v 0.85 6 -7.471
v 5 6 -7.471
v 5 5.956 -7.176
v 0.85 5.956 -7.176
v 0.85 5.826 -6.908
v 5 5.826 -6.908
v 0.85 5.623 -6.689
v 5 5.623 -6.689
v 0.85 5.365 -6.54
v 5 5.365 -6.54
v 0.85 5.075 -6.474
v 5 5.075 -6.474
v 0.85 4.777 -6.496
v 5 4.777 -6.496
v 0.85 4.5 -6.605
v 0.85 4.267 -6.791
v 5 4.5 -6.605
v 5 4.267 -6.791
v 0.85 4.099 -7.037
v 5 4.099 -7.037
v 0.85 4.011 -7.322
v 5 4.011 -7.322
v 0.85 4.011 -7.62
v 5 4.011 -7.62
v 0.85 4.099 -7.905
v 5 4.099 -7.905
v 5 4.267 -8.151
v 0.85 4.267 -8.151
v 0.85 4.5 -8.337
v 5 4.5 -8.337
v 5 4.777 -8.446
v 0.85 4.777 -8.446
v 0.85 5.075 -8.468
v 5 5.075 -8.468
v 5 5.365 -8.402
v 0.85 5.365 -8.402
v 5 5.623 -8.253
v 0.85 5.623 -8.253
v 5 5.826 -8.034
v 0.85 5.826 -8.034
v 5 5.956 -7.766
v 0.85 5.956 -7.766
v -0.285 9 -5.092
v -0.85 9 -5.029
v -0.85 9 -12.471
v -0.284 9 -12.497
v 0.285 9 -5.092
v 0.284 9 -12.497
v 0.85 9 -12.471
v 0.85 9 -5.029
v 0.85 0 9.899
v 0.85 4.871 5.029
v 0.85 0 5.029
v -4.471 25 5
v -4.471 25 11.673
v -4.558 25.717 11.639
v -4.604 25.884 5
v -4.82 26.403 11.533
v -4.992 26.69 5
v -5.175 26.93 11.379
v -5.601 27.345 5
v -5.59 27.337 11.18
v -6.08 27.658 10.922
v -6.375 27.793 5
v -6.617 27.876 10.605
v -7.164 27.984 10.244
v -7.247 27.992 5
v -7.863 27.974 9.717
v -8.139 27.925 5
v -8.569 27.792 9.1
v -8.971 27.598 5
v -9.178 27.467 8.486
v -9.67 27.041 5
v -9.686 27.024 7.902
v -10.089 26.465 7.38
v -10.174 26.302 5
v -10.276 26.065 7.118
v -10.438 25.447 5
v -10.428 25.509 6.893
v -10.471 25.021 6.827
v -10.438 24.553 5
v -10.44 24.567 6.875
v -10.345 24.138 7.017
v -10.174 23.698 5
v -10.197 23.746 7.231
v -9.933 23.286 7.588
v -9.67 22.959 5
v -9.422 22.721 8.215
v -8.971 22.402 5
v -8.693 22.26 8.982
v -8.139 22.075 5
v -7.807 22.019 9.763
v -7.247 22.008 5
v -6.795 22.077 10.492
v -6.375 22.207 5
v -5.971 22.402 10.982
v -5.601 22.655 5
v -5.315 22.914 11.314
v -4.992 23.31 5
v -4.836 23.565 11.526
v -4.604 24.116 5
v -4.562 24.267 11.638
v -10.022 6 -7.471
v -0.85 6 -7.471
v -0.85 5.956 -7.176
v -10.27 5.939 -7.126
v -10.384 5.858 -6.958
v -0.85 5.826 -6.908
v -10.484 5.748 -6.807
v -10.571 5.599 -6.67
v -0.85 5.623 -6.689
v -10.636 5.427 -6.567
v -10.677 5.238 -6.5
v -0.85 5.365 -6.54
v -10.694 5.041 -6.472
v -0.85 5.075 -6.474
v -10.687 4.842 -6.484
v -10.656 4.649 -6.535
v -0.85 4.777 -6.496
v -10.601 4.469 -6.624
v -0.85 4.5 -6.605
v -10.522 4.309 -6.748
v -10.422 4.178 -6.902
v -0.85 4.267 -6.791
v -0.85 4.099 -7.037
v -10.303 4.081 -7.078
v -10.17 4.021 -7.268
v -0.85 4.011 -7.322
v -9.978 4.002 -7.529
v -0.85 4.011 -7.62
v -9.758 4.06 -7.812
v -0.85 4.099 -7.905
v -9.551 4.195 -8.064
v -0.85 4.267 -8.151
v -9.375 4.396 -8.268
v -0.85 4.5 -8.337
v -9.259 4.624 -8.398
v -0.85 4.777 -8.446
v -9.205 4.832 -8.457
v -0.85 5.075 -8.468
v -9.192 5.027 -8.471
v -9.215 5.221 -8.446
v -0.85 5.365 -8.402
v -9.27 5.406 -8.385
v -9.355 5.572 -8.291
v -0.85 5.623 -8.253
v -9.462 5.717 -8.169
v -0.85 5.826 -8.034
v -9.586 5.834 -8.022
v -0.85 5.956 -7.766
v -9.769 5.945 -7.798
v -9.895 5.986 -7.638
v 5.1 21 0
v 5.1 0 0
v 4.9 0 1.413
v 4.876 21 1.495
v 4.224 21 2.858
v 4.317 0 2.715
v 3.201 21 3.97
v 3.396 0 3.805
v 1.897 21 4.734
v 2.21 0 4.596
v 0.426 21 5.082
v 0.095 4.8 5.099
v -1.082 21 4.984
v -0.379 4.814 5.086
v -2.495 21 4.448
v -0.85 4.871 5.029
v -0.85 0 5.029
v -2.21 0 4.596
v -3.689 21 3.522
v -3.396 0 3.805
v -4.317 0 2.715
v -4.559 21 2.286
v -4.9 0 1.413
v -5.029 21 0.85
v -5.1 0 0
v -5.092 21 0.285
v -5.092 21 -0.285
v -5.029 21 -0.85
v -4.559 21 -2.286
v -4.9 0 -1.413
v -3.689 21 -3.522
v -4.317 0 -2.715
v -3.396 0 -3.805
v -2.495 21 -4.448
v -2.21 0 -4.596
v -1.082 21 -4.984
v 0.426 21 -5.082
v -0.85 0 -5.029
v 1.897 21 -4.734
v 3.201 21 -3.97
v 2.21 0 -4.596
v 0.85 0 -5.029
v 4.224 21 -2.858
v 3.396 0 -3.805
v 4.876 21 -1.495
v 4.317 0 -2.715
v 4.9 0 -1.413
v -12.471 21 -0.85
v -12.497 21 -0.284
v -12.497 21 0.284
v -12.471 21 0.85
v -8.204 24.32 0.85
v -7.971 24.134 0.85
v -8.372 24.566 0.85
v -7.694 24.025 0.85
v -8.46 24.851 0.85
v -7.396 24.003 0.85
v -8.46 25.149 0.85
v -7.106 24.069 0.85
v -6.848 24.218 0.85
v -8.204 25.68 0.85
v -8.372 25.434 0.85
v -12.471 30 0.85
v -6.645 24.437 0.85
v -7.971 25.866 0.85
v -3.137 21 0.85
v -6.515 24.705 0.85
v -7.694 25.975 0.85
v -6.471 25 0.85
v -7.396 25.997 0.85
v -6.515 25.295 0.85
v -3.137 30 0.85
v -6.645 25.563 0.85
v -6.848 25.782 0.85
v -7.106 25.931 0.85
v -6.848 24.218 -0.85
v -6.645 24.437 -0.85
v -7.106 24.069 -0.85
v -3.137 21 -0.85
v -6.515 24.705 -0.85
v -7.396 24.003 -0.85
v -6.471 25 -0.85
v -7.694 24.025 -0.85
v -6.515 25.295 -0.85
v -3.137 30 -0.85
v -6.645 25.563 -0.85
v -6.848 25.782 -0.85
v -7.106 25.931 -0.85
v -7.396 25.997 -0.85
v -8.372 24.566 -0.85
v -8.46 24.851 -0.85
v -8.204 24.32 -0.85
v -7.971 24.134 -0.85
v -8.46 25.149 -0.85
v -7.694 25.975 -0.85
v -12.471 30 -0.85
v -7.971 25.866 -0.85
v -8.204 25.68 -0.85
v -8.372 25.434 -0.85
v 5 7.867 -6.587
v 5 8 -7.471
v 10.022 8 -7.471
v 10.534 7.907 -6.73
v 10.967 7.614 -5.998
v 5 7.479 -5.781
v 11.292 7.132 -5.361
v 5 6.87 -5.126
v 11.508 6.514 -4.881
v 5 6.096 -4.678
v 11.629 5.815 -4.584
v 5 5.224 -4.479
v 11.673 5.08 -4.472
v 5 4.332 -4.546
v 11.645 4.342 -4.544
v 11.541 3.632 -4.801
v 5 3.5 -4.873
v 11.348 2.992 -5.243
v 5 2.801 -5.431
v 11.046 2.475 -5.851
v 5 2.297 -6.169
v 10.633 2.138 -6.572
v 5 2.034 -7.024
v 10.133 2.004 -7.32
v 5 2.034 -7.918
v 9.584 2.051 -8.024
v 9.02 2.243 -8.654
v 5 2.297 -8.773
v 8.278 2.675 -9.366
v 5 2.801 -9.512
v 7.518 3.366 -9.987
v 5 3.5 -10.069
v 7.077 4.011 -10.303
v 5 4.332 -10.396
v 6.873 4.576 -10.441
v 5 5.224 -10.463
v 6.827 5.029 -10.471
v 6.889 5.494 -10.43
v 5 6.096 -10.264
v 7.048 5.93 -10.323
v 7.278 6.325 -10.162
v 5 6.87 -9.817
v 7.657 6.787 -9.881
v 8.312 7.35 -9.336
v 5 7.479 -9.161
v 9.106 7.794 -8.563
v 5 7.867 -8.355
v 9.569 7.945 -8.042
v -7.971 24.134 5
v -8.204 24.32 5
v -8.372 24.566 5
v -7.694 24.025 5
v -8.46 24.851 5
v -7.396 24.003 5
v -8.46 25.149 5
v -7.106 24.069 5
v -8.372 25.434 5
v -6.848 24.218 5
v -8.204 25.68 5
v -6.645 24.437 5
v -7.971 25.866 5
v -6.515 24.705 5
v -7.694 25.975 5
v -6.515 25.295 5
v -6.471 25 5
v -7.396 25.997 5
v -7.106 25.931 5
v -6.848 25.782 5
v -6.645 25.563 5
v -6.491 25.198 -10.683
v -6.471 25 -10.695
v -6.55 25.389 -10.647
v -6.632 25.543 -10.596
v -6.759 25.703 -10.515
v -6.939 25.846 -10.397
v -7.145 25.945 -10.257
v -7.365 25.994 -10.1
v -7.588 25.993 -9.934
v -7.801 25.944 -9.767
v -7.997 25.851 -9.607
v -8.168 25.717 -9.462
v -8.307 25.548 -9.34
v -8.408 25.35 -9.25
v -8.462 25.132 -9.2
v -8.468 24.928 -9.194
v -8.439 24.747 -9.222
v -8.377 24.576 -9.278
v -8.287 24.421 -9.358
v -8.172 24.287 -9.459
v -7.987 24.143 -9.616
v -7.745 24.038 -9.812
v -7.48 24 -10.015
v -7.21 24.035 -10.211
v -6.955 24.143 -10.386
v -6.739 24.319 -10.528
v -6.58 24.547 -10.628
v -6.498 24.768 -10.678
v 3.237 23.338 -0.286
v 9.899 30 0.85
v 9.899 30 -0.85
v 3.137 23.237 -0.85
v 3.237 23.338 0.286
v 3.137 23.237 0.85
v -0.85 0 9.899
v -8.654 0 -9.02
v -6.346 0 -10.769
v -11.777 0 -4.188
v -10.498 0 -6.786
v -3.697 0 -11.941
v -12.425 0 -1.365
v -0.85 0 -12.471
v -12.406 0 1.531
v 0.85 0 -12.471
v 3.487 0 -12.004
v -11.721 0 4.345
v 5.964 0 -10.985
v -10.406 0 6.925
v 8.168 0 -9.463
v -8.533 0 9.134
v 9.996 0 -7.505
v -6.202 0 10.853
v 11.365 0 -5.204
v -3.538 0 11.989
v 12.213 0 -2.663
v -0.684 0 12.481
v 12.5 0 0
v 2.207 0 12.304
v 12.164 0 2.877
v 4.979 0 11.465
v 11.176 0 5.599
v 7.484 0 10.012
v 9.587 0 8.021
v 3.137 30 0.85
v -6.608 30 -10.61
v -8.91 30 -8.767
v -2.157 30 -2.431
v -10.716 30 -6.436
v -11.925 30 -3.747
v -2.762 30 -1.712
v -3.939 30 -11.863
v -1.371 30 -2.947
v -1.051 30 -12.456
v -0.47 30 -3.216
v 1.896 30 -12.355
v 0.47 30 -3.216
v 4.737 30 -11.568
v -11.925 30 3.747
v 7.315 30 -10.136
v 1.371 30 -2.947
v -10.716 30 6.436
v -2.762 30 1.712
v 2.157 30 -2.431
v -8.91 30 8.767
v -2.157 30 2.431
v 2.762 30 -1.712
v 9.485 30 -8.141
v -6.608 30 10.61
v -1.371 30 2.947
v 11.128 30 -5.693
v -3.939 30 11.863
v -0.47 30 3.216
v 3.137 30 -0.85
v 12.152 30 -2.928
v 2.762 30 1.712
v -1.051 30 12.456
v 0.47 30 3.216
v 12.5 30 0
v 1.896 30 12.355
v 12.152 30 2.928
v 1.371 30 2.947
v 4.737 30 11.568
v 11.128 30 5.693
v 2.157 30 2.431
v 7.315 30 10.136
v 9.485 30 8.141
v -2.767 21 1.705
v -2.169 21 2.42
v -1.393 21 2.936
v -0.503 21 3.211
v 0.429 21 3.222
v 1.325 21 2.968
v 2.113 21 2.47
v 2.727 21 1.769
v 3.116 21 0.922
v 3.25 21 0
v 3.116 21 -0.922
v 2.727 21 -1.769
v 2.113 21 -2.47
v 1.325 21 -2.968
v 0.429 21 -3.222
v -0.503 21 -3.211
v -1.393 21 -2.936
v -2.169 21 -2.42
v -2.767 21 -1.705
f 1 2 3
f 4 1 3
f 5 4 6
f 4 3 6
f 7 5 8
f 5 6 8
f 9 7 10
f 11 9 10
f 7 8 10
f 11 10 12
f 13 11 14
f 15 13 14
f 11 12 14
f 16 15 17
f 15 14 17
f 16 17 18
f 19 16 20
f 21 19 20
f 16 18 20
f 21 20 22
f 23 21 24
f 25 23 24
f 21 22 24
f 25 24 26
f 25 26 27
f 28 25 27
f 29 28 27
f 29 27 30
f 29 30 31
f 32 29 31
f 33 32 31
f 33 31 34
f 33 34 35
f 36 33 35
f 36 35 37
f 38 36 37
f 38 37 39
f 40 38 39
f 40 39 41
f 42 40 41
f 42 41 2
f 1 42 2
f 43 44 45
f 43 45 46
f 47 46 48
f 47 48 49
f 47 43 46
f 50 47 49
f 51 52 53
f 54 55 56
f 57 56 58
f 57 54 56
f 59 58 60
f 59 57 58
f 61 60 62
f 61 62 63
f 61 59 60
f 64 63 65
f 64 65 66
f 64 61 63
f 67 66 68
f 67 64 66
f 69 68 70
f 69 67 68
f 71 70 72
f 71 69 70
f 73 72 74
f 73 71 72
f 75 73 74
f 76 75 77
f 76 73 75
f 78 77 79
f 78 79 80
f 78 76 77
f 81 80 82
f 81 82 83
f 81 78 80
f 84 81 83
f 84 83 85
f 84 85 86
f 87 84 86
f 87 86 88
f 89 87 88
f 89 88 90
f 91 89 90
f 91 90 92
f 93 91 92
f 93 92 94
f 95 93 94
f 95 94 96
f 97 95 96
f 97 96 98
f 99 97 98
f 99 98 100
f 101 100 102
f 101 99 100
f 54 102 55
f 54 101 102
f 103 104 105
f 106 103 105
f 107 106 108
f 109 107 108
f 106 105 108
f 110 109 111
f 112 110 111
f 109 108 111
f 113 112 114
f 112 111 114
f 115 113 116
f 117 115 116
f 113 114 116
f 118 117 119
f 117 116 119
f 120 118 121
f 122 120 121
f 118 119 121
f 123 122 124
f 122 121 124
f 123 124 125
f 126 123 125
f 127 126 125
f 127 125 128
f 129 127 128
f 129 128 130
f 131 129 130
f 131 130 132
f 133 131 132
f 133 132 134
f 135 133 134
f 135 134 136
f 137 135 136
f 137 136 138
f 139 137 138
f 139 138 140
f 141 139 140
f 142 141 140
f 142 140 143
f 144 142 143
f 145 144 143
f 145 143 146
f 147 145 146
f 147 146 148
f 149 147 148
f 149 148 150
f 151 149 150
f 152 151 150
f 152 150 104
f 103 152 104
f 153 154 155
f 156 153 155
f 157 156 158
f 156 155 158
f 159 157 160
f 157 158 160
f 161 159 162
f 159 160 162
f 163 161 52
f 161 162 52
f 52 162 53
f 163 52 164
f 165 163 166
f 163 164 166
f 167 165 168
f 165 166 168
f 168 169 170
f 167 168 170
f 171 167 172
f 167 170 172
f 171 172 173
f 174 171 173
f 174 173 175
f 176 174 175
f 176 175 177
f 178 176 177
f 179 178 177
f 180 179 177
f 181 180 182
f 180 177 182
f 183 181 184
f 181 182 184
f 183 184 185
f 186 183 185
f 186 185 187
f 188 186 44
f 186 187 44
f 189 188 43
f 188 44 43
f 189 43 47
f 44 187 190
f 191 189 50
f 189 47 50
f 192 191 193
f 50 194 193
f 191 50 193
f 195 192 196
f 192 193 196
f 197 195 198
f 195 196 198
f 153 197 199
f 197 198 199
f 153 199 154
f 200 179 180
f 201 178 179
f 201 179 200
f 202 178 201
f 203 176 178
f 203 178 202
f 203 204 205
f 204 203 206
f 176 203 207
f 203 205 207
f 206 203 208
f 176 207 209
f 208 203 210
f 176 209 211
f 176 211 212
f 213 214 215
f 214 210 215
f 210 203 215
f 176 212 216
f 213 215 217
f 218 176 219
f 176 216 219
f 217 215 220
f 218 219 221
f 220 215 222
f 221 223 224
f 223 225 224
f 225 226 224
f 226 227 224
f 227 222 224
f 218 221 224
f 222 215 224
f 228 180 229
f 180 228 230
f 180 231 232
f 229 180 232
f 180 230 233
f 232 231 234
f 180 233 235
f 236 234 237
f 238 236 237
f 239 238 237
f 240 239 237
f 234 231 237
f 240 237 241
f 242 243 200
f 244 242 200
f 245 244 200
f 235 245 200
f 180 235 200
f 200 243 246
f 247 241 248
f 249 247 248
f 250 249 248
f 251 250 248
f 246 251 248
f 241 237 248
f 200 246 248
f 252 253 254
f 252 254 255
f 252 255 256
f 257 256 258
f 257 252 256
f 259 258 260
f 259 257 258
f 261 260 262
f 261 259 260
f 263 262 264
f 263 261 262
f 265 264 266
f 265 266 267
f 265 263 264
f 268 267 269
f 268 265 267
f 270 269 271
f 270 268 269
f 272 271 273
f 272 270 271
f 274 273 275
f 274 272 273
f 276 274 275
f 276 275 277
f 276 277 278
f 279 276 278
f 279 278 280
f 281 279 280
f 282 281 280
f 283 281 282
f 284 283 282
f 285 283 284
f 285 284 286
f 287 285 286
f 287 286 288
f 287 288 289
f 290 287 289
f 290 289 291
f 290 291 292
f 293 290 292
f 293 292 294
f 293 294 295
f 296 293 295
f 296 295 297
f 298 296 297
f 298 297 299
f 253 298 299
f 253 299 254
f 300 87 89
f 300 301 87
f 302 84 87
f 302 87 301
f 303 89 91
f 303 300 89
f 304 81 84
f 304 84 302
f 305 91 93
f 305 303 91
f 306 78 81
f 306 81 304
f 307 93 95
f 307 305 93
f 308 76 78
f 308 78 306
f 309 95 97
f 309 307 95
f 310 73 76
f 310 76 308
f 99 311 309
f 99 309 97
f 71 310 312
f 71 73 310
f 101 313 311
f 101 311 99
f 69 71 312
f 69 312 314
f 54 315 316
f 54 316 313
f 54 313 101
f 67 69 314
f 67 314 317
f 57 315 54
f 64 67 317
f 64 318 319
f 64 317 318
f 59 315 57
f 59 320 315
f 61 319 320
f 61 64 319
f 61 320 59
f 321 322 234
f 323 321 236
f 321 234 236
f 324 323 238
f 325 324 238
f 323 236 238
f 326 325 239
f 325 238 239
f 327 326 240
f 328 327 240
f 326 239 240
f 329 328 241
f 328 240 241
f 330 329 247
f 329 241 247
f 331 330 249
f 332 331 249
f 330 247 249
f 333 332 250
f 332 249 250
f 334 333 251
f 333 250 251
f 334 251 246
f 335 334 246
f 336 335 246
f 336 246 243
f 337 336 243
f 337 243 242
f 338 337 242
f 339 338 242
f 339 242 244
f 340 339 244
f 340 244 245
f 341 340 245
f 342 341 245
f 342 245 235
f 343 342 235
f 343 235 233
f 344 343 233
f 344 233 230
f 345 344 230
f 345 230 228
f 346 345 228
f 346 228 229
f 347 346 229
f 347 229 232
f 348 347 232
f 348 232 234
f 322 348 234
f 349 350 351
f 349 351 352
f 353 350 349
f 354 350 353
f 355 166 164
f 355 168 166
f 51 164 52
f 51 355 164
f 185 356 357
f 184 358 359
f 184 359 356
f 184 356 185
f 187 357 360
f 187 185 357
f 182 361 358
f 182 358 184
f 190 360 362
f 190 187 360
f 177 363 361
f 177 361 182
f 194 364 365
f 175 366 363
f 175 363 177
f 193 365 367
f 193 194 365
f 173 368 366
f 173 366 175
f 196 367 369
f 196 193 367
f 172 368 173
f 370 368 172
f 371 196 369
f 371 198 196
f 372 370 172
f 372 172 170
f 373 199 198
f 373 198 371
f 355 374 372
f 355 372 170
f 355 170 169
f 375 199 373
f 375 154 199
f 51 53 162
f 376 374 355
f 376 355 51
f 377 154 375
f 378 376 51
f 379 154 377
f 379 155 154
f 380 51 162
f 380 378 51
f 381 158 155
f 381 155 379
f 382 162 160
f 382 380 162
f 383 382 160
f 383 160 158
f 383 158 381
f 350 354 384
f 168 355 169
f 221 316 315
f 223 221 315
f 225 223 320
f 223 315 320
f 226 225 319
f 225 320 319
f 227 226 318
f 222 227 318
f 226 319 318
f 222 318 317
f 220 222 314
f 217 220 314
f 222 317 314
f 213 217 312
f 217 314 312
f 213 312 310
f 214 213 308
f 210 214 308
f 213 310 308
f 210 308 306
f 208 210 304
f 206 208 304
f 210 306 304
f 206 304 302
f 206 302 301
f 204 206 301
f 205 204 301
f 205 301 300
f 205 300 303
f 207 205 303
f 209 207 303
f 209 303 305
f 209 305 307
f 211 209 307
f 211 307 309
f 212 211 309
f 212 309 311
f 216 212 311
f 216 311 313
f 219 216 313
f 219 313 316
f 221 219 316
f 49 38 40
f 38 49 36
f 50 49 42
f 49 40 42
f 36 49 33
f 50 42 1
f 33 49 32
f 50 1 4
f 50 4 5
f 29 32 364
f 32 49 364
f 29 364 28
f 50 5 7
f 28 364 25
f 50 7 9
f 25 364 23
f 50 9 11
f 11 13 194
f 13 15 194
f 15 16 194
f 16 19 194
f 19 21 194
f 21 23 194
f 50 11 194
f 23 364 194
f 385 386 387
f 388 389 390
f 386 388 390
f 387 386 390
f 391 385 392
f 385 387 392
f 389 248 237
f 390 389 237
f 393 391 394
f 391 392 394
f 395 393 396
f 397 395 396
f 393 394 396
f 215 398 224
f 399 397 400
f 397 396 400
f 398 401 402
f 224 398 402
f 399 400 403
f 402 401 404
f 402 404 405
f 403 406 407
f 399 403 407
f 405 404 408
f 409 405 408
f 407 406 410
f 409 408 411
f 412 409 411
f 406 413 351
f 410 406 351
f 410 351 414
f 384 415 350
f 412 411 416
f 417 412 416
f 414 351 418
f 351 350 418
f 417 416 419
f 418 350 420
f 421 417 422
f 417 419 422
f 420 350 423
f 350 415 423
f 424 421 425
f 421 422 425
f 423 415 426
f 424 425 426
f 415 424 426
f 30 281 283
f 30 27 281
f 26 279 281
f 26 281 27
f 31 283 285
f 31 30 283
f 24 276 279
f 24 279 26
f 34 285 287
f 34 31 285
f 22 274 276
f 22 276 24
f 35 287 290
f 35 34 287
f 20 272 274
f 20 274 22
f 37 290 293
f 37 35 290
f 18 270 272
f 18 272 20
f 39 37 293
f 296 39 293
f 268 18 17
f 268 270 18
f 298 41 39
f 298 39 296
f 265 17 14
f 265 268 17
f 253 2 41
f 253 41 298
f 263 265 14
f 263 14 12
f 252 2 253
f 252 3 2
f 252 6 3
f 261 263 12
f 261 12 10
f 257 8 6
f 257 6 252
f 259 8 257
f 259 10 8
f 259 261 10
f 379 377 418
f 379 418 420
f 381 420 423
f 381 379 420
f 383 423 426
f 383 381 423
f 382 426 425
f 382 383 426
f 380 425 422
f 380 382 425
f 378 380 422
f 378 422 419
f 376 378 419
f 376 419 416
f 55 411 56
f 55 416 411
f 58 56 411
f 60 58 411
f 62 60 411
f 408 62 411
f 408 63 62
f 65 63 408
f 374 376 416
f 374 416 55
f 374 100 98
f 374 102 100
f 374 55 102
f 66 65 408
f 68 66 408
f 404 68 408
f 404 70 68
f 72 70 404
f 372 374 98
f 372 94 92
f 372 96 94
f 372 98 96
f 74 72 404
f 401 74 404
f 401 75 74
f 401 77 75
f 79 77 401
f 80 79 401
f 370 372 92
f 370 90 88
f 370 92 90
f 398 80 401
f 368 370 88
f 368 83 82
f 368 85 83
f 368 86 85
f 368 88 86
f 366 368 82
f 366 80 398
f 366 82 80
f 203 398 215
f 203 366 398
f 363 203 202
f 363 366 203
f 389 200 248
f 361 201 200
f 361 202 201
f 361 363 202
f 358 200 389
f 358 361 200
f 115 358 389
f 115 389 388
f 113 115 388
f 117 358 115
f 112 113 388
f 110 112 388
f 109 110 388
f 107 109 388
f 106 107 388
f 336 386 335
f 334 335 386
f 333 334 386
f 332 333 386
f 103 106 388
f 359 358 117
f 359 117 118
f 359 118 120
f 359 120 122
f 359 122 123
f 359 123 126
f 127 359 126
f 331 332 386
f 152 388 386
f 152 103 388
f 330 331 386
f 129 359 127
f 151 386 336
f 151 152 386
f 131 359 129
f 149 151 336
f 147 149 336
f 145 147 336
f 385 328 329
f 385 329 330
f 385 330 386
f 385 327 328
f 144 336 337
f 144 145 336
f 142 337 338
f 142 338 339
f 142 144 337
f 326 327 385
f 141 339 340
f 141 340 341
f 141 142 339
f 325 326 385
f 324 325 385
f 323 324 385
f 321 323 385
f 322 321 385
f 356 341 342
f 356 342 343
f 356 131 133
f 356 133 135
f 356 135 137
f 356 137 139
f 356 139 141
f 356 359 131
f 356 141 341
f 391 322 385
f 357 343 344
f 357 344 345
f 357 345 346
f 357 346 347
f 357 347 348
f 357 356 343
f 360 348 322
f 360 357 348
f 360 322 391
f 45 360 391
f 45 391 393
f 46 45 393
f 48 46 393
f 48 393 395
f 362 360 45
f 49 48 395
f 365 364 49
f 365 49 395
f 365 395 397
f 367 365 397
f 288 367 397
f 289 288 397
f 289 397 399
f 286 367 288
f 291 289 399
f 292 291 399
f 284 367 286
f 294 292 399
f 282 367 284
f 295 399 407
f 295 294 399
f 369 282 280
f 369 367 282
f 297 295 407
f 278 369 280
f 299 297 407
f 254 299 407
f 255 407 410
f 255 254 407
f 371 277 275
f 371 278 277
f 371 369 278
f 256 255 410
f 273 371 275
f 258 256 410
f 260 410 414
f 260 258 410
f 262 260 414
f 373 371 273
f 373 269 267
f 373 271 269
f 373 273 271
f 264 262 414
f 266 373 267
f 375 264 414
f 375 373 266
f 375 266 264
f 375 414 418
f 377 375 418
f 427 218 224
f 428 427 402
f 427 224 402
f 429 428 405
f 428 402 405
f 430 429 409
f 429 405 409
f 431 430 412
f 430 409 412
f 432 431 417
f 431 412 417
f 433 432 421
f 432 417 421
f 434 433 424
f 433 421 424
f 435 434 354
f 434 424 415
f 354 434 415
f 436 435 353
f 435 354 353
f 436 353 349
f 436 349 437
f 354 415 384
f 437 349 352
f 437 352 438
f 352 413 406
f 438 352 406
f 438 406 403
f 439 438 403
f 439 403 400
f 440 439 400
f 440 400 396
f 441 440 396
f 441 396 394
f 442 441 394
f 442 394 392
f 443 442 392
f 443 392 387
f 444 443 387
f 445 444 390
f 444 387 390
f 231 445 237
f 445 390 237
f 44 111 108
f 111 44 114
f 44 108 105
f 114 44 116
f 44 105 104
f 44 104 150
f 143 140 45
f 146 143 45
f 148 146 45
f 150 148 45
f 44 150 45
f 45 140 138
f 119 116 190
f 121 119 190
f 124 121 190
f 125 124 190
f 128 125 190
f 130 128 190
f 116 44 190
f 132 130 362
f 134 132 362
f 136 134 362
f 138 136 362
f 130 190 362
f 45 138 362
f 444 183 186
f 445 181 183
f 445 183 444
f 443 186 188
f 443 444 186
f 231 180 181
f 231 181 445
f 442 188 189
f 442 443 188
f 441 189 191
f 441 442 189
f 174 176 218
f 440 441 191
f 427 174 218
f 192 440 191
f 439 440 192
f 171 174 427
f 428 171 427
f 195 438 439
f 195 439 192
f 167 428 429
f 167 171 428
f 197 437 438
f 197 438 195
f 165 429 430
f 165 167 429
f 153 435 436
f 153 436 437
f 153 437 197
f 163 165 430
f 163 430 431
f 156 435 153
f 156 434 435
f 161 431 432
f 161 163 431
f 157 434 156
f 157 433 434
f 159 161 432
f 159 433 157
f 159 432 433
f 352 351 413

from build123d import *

# Parameters (mm, degrees)
F0_R      = 12.5
F1_DEPTH  = 30
F2_R      = 5.1
F3_DEPTH  = 21
F4_R      = 3.25
F5_DEPTH  = 30
F7_DEPTH  = 9
F11_DEPTH = 4.7828926987
F13_DEPTH = 9
F17_DEPTH = 25
F19_R     = 3
F20_DEPTH = 6.6740273092
F21_R     = 1
F22_DEPTH = 17.5010001
F24_R     = 3
F25_DEPTH = 6.6740273092
F26_R     = 1
F27_DEPTH = 17.5010001


with BuildPart() as f1:
    # F0 (on Front) → F1 (new body)
    with BuildSketch(Plane.XZ):
        Circle(F0_R)
    extrude(amount=-F1_DEPTH)

    # F2 (on face) → F3 (cut)
    with BuildSketch(Plane.XZ):
        Circle(F2_R)
    extrude(amount=-F3_DEPTH, mode=Mode.SUBTRACT)

    # F4 (on face) → F5 (cut)
    with BuildSketch(Plane(origin=(0, 30, 0), x_dir=(-1, 0, 0), z_dir=(0, 1, 0))):
        Circle(F4_R)
    extrude(amount=-F5_DEPTH, mode=Mode.SUBTRACT)

    # F6 (on face) → F7 (cut)
    with BuildSketch(Plane(origin=(0, 30, 0), x_dir=(-1, 0, 0), z_dir=(0, 1, 0))):
        with BuildLine():
            Line((12.4710665141, 0.85), (3.1368774283, 0.85))
            ThreePointArc((3.1368774283, 0.85), (3.25, 0), (3.1368774283, -0.85))
            Line((3.1368774283, -0.85), (12.4710665141, -0.85))
            ThreePointArc((12.4710665141, -0.85), (12.5, 0), (12.4710665141, 0.85))
        make_face()
    extrude(amount=-F7_DEPTH, mode=Mode.SUBTRACT)

    # F10 (on offset) → F11 (cut, through all)
    with BuildSketch(Plane(origin=(-10.0502525317, 10.0502525317, 0), x_dir=(-0.7071067812, -0.7071067812, 0), z_dir=(-0.7071067812, 0.7071067812, 0))):
        with BuildLine():
            Line((-15.0315791364, 0.85), (-30.0315791364, 0.85))
            add(Edge.make_bspline(
                [(-30.0315791364, 0.85), (-30.0725447305, 0), (-30.0315791364, -0.85)],
                knots=[4.6443364657, 4.6443364657, 4.6443364657, 4.7804414951, 4.7804414951, 4.7804414951], degree=2, weights=[1, 0.9976853211, 1]))
            Line((-30.0315791364, -0.85), (-15.0315791364, -0.85))
            Line((-15.0315791364, -0.85), (-15.0315791364, 0.85))
        make_face()
    extrude(amount=F11_DEPTH, mode=Mode.SUBTRACT)

    # F12 (on face) → F13 (cut)
    with BuildSketch(Plane.XZ):
        with BuildLine():
            ThreePointArc((0.85, -5.0286678156), (0, -5.1), (-0.85, -5.0286678156))
            Line((-0.85, -5.0286678156), (-0.85, -12.4710665141))
            ThreePointArc((-0.85, -12.4710665141), (0, -12.5), (0.85, -12.4710665141))
            Line((0.85, -12.4710665141), (0.85, -5.0286678156))
        make_face()
    extrude(amount=-F13_DEPTH, mode=Mode.SUBTRACT)

    # F16 (on offset) → F17 (cut)
    with BuildSketch(Plane(origin=(0, 4.9497474683, 4.9497474683), x_dir=(1, 0, 0), z_dir=(0, -0.7071067812, -0.7071067812))):
        with BuildLine():
            Line((-0.85, 8.8183757008), (-0.85, -6.1816242992))
            Line((-0.85, -6.1816242992), (0.85, -6.1816242992))
            Line((0.85, -6.1816242992), (0.85, 8.8183757008))
            add(Edge.make_bspline(
                [(0.85, 8.8183757008), (0, 8.8593412949), (-0.85, 8.8183757008)],
                knots=[1.5027438121, 1.5027438121, 1.5027438121, 1.6388488415, 1.6388488415, 1.6388488415], degree=2, weights=[1, 0.9976853211, 1]))
        make_face()
    extrude(amount=F17_DEPTH, mode=Mode.SUBTRACT)

    # F19 (on offset) → F20 (cut, through all)
    with BuildSketch(Plane.YZ.offset(5)):
        with Locations((5, -7.4710665141)):
            Circle(F19_R)
    extrude(amount=F20_DEPTH, mode=Mode.SUBTRACT)

    # F21 (on face) → F22 (cut, through all)
    with BuildSketch(Plane.YZ.offset(5)):
        with Locations((5, -7.4710665141)):
            Circle(F21_R)
    extrude(amount=-F22_DEPTH, mode=Mode.SUBTRACT)

    # F24 (on offset) → F25 (cut, through all)
    with BuildSketch(Plane.XY.offset(5)):
        with Locations((-7.4710665141, 25)):
            Circle(F24_R)
    extrude(amount=F25_DEPTH, mode=Mode.SUBTRACT)

    # F26 (on face) → F27 (cut, through all)
    with BuildSketch(Plane.XY.offset(5)):
        with Locations((-7.4710665141, 25)):
            Circle(F26_R)
    extrude(amount=-F27_DEPTH, mode=Mode.SUBTRACT)


solid = f1.part
